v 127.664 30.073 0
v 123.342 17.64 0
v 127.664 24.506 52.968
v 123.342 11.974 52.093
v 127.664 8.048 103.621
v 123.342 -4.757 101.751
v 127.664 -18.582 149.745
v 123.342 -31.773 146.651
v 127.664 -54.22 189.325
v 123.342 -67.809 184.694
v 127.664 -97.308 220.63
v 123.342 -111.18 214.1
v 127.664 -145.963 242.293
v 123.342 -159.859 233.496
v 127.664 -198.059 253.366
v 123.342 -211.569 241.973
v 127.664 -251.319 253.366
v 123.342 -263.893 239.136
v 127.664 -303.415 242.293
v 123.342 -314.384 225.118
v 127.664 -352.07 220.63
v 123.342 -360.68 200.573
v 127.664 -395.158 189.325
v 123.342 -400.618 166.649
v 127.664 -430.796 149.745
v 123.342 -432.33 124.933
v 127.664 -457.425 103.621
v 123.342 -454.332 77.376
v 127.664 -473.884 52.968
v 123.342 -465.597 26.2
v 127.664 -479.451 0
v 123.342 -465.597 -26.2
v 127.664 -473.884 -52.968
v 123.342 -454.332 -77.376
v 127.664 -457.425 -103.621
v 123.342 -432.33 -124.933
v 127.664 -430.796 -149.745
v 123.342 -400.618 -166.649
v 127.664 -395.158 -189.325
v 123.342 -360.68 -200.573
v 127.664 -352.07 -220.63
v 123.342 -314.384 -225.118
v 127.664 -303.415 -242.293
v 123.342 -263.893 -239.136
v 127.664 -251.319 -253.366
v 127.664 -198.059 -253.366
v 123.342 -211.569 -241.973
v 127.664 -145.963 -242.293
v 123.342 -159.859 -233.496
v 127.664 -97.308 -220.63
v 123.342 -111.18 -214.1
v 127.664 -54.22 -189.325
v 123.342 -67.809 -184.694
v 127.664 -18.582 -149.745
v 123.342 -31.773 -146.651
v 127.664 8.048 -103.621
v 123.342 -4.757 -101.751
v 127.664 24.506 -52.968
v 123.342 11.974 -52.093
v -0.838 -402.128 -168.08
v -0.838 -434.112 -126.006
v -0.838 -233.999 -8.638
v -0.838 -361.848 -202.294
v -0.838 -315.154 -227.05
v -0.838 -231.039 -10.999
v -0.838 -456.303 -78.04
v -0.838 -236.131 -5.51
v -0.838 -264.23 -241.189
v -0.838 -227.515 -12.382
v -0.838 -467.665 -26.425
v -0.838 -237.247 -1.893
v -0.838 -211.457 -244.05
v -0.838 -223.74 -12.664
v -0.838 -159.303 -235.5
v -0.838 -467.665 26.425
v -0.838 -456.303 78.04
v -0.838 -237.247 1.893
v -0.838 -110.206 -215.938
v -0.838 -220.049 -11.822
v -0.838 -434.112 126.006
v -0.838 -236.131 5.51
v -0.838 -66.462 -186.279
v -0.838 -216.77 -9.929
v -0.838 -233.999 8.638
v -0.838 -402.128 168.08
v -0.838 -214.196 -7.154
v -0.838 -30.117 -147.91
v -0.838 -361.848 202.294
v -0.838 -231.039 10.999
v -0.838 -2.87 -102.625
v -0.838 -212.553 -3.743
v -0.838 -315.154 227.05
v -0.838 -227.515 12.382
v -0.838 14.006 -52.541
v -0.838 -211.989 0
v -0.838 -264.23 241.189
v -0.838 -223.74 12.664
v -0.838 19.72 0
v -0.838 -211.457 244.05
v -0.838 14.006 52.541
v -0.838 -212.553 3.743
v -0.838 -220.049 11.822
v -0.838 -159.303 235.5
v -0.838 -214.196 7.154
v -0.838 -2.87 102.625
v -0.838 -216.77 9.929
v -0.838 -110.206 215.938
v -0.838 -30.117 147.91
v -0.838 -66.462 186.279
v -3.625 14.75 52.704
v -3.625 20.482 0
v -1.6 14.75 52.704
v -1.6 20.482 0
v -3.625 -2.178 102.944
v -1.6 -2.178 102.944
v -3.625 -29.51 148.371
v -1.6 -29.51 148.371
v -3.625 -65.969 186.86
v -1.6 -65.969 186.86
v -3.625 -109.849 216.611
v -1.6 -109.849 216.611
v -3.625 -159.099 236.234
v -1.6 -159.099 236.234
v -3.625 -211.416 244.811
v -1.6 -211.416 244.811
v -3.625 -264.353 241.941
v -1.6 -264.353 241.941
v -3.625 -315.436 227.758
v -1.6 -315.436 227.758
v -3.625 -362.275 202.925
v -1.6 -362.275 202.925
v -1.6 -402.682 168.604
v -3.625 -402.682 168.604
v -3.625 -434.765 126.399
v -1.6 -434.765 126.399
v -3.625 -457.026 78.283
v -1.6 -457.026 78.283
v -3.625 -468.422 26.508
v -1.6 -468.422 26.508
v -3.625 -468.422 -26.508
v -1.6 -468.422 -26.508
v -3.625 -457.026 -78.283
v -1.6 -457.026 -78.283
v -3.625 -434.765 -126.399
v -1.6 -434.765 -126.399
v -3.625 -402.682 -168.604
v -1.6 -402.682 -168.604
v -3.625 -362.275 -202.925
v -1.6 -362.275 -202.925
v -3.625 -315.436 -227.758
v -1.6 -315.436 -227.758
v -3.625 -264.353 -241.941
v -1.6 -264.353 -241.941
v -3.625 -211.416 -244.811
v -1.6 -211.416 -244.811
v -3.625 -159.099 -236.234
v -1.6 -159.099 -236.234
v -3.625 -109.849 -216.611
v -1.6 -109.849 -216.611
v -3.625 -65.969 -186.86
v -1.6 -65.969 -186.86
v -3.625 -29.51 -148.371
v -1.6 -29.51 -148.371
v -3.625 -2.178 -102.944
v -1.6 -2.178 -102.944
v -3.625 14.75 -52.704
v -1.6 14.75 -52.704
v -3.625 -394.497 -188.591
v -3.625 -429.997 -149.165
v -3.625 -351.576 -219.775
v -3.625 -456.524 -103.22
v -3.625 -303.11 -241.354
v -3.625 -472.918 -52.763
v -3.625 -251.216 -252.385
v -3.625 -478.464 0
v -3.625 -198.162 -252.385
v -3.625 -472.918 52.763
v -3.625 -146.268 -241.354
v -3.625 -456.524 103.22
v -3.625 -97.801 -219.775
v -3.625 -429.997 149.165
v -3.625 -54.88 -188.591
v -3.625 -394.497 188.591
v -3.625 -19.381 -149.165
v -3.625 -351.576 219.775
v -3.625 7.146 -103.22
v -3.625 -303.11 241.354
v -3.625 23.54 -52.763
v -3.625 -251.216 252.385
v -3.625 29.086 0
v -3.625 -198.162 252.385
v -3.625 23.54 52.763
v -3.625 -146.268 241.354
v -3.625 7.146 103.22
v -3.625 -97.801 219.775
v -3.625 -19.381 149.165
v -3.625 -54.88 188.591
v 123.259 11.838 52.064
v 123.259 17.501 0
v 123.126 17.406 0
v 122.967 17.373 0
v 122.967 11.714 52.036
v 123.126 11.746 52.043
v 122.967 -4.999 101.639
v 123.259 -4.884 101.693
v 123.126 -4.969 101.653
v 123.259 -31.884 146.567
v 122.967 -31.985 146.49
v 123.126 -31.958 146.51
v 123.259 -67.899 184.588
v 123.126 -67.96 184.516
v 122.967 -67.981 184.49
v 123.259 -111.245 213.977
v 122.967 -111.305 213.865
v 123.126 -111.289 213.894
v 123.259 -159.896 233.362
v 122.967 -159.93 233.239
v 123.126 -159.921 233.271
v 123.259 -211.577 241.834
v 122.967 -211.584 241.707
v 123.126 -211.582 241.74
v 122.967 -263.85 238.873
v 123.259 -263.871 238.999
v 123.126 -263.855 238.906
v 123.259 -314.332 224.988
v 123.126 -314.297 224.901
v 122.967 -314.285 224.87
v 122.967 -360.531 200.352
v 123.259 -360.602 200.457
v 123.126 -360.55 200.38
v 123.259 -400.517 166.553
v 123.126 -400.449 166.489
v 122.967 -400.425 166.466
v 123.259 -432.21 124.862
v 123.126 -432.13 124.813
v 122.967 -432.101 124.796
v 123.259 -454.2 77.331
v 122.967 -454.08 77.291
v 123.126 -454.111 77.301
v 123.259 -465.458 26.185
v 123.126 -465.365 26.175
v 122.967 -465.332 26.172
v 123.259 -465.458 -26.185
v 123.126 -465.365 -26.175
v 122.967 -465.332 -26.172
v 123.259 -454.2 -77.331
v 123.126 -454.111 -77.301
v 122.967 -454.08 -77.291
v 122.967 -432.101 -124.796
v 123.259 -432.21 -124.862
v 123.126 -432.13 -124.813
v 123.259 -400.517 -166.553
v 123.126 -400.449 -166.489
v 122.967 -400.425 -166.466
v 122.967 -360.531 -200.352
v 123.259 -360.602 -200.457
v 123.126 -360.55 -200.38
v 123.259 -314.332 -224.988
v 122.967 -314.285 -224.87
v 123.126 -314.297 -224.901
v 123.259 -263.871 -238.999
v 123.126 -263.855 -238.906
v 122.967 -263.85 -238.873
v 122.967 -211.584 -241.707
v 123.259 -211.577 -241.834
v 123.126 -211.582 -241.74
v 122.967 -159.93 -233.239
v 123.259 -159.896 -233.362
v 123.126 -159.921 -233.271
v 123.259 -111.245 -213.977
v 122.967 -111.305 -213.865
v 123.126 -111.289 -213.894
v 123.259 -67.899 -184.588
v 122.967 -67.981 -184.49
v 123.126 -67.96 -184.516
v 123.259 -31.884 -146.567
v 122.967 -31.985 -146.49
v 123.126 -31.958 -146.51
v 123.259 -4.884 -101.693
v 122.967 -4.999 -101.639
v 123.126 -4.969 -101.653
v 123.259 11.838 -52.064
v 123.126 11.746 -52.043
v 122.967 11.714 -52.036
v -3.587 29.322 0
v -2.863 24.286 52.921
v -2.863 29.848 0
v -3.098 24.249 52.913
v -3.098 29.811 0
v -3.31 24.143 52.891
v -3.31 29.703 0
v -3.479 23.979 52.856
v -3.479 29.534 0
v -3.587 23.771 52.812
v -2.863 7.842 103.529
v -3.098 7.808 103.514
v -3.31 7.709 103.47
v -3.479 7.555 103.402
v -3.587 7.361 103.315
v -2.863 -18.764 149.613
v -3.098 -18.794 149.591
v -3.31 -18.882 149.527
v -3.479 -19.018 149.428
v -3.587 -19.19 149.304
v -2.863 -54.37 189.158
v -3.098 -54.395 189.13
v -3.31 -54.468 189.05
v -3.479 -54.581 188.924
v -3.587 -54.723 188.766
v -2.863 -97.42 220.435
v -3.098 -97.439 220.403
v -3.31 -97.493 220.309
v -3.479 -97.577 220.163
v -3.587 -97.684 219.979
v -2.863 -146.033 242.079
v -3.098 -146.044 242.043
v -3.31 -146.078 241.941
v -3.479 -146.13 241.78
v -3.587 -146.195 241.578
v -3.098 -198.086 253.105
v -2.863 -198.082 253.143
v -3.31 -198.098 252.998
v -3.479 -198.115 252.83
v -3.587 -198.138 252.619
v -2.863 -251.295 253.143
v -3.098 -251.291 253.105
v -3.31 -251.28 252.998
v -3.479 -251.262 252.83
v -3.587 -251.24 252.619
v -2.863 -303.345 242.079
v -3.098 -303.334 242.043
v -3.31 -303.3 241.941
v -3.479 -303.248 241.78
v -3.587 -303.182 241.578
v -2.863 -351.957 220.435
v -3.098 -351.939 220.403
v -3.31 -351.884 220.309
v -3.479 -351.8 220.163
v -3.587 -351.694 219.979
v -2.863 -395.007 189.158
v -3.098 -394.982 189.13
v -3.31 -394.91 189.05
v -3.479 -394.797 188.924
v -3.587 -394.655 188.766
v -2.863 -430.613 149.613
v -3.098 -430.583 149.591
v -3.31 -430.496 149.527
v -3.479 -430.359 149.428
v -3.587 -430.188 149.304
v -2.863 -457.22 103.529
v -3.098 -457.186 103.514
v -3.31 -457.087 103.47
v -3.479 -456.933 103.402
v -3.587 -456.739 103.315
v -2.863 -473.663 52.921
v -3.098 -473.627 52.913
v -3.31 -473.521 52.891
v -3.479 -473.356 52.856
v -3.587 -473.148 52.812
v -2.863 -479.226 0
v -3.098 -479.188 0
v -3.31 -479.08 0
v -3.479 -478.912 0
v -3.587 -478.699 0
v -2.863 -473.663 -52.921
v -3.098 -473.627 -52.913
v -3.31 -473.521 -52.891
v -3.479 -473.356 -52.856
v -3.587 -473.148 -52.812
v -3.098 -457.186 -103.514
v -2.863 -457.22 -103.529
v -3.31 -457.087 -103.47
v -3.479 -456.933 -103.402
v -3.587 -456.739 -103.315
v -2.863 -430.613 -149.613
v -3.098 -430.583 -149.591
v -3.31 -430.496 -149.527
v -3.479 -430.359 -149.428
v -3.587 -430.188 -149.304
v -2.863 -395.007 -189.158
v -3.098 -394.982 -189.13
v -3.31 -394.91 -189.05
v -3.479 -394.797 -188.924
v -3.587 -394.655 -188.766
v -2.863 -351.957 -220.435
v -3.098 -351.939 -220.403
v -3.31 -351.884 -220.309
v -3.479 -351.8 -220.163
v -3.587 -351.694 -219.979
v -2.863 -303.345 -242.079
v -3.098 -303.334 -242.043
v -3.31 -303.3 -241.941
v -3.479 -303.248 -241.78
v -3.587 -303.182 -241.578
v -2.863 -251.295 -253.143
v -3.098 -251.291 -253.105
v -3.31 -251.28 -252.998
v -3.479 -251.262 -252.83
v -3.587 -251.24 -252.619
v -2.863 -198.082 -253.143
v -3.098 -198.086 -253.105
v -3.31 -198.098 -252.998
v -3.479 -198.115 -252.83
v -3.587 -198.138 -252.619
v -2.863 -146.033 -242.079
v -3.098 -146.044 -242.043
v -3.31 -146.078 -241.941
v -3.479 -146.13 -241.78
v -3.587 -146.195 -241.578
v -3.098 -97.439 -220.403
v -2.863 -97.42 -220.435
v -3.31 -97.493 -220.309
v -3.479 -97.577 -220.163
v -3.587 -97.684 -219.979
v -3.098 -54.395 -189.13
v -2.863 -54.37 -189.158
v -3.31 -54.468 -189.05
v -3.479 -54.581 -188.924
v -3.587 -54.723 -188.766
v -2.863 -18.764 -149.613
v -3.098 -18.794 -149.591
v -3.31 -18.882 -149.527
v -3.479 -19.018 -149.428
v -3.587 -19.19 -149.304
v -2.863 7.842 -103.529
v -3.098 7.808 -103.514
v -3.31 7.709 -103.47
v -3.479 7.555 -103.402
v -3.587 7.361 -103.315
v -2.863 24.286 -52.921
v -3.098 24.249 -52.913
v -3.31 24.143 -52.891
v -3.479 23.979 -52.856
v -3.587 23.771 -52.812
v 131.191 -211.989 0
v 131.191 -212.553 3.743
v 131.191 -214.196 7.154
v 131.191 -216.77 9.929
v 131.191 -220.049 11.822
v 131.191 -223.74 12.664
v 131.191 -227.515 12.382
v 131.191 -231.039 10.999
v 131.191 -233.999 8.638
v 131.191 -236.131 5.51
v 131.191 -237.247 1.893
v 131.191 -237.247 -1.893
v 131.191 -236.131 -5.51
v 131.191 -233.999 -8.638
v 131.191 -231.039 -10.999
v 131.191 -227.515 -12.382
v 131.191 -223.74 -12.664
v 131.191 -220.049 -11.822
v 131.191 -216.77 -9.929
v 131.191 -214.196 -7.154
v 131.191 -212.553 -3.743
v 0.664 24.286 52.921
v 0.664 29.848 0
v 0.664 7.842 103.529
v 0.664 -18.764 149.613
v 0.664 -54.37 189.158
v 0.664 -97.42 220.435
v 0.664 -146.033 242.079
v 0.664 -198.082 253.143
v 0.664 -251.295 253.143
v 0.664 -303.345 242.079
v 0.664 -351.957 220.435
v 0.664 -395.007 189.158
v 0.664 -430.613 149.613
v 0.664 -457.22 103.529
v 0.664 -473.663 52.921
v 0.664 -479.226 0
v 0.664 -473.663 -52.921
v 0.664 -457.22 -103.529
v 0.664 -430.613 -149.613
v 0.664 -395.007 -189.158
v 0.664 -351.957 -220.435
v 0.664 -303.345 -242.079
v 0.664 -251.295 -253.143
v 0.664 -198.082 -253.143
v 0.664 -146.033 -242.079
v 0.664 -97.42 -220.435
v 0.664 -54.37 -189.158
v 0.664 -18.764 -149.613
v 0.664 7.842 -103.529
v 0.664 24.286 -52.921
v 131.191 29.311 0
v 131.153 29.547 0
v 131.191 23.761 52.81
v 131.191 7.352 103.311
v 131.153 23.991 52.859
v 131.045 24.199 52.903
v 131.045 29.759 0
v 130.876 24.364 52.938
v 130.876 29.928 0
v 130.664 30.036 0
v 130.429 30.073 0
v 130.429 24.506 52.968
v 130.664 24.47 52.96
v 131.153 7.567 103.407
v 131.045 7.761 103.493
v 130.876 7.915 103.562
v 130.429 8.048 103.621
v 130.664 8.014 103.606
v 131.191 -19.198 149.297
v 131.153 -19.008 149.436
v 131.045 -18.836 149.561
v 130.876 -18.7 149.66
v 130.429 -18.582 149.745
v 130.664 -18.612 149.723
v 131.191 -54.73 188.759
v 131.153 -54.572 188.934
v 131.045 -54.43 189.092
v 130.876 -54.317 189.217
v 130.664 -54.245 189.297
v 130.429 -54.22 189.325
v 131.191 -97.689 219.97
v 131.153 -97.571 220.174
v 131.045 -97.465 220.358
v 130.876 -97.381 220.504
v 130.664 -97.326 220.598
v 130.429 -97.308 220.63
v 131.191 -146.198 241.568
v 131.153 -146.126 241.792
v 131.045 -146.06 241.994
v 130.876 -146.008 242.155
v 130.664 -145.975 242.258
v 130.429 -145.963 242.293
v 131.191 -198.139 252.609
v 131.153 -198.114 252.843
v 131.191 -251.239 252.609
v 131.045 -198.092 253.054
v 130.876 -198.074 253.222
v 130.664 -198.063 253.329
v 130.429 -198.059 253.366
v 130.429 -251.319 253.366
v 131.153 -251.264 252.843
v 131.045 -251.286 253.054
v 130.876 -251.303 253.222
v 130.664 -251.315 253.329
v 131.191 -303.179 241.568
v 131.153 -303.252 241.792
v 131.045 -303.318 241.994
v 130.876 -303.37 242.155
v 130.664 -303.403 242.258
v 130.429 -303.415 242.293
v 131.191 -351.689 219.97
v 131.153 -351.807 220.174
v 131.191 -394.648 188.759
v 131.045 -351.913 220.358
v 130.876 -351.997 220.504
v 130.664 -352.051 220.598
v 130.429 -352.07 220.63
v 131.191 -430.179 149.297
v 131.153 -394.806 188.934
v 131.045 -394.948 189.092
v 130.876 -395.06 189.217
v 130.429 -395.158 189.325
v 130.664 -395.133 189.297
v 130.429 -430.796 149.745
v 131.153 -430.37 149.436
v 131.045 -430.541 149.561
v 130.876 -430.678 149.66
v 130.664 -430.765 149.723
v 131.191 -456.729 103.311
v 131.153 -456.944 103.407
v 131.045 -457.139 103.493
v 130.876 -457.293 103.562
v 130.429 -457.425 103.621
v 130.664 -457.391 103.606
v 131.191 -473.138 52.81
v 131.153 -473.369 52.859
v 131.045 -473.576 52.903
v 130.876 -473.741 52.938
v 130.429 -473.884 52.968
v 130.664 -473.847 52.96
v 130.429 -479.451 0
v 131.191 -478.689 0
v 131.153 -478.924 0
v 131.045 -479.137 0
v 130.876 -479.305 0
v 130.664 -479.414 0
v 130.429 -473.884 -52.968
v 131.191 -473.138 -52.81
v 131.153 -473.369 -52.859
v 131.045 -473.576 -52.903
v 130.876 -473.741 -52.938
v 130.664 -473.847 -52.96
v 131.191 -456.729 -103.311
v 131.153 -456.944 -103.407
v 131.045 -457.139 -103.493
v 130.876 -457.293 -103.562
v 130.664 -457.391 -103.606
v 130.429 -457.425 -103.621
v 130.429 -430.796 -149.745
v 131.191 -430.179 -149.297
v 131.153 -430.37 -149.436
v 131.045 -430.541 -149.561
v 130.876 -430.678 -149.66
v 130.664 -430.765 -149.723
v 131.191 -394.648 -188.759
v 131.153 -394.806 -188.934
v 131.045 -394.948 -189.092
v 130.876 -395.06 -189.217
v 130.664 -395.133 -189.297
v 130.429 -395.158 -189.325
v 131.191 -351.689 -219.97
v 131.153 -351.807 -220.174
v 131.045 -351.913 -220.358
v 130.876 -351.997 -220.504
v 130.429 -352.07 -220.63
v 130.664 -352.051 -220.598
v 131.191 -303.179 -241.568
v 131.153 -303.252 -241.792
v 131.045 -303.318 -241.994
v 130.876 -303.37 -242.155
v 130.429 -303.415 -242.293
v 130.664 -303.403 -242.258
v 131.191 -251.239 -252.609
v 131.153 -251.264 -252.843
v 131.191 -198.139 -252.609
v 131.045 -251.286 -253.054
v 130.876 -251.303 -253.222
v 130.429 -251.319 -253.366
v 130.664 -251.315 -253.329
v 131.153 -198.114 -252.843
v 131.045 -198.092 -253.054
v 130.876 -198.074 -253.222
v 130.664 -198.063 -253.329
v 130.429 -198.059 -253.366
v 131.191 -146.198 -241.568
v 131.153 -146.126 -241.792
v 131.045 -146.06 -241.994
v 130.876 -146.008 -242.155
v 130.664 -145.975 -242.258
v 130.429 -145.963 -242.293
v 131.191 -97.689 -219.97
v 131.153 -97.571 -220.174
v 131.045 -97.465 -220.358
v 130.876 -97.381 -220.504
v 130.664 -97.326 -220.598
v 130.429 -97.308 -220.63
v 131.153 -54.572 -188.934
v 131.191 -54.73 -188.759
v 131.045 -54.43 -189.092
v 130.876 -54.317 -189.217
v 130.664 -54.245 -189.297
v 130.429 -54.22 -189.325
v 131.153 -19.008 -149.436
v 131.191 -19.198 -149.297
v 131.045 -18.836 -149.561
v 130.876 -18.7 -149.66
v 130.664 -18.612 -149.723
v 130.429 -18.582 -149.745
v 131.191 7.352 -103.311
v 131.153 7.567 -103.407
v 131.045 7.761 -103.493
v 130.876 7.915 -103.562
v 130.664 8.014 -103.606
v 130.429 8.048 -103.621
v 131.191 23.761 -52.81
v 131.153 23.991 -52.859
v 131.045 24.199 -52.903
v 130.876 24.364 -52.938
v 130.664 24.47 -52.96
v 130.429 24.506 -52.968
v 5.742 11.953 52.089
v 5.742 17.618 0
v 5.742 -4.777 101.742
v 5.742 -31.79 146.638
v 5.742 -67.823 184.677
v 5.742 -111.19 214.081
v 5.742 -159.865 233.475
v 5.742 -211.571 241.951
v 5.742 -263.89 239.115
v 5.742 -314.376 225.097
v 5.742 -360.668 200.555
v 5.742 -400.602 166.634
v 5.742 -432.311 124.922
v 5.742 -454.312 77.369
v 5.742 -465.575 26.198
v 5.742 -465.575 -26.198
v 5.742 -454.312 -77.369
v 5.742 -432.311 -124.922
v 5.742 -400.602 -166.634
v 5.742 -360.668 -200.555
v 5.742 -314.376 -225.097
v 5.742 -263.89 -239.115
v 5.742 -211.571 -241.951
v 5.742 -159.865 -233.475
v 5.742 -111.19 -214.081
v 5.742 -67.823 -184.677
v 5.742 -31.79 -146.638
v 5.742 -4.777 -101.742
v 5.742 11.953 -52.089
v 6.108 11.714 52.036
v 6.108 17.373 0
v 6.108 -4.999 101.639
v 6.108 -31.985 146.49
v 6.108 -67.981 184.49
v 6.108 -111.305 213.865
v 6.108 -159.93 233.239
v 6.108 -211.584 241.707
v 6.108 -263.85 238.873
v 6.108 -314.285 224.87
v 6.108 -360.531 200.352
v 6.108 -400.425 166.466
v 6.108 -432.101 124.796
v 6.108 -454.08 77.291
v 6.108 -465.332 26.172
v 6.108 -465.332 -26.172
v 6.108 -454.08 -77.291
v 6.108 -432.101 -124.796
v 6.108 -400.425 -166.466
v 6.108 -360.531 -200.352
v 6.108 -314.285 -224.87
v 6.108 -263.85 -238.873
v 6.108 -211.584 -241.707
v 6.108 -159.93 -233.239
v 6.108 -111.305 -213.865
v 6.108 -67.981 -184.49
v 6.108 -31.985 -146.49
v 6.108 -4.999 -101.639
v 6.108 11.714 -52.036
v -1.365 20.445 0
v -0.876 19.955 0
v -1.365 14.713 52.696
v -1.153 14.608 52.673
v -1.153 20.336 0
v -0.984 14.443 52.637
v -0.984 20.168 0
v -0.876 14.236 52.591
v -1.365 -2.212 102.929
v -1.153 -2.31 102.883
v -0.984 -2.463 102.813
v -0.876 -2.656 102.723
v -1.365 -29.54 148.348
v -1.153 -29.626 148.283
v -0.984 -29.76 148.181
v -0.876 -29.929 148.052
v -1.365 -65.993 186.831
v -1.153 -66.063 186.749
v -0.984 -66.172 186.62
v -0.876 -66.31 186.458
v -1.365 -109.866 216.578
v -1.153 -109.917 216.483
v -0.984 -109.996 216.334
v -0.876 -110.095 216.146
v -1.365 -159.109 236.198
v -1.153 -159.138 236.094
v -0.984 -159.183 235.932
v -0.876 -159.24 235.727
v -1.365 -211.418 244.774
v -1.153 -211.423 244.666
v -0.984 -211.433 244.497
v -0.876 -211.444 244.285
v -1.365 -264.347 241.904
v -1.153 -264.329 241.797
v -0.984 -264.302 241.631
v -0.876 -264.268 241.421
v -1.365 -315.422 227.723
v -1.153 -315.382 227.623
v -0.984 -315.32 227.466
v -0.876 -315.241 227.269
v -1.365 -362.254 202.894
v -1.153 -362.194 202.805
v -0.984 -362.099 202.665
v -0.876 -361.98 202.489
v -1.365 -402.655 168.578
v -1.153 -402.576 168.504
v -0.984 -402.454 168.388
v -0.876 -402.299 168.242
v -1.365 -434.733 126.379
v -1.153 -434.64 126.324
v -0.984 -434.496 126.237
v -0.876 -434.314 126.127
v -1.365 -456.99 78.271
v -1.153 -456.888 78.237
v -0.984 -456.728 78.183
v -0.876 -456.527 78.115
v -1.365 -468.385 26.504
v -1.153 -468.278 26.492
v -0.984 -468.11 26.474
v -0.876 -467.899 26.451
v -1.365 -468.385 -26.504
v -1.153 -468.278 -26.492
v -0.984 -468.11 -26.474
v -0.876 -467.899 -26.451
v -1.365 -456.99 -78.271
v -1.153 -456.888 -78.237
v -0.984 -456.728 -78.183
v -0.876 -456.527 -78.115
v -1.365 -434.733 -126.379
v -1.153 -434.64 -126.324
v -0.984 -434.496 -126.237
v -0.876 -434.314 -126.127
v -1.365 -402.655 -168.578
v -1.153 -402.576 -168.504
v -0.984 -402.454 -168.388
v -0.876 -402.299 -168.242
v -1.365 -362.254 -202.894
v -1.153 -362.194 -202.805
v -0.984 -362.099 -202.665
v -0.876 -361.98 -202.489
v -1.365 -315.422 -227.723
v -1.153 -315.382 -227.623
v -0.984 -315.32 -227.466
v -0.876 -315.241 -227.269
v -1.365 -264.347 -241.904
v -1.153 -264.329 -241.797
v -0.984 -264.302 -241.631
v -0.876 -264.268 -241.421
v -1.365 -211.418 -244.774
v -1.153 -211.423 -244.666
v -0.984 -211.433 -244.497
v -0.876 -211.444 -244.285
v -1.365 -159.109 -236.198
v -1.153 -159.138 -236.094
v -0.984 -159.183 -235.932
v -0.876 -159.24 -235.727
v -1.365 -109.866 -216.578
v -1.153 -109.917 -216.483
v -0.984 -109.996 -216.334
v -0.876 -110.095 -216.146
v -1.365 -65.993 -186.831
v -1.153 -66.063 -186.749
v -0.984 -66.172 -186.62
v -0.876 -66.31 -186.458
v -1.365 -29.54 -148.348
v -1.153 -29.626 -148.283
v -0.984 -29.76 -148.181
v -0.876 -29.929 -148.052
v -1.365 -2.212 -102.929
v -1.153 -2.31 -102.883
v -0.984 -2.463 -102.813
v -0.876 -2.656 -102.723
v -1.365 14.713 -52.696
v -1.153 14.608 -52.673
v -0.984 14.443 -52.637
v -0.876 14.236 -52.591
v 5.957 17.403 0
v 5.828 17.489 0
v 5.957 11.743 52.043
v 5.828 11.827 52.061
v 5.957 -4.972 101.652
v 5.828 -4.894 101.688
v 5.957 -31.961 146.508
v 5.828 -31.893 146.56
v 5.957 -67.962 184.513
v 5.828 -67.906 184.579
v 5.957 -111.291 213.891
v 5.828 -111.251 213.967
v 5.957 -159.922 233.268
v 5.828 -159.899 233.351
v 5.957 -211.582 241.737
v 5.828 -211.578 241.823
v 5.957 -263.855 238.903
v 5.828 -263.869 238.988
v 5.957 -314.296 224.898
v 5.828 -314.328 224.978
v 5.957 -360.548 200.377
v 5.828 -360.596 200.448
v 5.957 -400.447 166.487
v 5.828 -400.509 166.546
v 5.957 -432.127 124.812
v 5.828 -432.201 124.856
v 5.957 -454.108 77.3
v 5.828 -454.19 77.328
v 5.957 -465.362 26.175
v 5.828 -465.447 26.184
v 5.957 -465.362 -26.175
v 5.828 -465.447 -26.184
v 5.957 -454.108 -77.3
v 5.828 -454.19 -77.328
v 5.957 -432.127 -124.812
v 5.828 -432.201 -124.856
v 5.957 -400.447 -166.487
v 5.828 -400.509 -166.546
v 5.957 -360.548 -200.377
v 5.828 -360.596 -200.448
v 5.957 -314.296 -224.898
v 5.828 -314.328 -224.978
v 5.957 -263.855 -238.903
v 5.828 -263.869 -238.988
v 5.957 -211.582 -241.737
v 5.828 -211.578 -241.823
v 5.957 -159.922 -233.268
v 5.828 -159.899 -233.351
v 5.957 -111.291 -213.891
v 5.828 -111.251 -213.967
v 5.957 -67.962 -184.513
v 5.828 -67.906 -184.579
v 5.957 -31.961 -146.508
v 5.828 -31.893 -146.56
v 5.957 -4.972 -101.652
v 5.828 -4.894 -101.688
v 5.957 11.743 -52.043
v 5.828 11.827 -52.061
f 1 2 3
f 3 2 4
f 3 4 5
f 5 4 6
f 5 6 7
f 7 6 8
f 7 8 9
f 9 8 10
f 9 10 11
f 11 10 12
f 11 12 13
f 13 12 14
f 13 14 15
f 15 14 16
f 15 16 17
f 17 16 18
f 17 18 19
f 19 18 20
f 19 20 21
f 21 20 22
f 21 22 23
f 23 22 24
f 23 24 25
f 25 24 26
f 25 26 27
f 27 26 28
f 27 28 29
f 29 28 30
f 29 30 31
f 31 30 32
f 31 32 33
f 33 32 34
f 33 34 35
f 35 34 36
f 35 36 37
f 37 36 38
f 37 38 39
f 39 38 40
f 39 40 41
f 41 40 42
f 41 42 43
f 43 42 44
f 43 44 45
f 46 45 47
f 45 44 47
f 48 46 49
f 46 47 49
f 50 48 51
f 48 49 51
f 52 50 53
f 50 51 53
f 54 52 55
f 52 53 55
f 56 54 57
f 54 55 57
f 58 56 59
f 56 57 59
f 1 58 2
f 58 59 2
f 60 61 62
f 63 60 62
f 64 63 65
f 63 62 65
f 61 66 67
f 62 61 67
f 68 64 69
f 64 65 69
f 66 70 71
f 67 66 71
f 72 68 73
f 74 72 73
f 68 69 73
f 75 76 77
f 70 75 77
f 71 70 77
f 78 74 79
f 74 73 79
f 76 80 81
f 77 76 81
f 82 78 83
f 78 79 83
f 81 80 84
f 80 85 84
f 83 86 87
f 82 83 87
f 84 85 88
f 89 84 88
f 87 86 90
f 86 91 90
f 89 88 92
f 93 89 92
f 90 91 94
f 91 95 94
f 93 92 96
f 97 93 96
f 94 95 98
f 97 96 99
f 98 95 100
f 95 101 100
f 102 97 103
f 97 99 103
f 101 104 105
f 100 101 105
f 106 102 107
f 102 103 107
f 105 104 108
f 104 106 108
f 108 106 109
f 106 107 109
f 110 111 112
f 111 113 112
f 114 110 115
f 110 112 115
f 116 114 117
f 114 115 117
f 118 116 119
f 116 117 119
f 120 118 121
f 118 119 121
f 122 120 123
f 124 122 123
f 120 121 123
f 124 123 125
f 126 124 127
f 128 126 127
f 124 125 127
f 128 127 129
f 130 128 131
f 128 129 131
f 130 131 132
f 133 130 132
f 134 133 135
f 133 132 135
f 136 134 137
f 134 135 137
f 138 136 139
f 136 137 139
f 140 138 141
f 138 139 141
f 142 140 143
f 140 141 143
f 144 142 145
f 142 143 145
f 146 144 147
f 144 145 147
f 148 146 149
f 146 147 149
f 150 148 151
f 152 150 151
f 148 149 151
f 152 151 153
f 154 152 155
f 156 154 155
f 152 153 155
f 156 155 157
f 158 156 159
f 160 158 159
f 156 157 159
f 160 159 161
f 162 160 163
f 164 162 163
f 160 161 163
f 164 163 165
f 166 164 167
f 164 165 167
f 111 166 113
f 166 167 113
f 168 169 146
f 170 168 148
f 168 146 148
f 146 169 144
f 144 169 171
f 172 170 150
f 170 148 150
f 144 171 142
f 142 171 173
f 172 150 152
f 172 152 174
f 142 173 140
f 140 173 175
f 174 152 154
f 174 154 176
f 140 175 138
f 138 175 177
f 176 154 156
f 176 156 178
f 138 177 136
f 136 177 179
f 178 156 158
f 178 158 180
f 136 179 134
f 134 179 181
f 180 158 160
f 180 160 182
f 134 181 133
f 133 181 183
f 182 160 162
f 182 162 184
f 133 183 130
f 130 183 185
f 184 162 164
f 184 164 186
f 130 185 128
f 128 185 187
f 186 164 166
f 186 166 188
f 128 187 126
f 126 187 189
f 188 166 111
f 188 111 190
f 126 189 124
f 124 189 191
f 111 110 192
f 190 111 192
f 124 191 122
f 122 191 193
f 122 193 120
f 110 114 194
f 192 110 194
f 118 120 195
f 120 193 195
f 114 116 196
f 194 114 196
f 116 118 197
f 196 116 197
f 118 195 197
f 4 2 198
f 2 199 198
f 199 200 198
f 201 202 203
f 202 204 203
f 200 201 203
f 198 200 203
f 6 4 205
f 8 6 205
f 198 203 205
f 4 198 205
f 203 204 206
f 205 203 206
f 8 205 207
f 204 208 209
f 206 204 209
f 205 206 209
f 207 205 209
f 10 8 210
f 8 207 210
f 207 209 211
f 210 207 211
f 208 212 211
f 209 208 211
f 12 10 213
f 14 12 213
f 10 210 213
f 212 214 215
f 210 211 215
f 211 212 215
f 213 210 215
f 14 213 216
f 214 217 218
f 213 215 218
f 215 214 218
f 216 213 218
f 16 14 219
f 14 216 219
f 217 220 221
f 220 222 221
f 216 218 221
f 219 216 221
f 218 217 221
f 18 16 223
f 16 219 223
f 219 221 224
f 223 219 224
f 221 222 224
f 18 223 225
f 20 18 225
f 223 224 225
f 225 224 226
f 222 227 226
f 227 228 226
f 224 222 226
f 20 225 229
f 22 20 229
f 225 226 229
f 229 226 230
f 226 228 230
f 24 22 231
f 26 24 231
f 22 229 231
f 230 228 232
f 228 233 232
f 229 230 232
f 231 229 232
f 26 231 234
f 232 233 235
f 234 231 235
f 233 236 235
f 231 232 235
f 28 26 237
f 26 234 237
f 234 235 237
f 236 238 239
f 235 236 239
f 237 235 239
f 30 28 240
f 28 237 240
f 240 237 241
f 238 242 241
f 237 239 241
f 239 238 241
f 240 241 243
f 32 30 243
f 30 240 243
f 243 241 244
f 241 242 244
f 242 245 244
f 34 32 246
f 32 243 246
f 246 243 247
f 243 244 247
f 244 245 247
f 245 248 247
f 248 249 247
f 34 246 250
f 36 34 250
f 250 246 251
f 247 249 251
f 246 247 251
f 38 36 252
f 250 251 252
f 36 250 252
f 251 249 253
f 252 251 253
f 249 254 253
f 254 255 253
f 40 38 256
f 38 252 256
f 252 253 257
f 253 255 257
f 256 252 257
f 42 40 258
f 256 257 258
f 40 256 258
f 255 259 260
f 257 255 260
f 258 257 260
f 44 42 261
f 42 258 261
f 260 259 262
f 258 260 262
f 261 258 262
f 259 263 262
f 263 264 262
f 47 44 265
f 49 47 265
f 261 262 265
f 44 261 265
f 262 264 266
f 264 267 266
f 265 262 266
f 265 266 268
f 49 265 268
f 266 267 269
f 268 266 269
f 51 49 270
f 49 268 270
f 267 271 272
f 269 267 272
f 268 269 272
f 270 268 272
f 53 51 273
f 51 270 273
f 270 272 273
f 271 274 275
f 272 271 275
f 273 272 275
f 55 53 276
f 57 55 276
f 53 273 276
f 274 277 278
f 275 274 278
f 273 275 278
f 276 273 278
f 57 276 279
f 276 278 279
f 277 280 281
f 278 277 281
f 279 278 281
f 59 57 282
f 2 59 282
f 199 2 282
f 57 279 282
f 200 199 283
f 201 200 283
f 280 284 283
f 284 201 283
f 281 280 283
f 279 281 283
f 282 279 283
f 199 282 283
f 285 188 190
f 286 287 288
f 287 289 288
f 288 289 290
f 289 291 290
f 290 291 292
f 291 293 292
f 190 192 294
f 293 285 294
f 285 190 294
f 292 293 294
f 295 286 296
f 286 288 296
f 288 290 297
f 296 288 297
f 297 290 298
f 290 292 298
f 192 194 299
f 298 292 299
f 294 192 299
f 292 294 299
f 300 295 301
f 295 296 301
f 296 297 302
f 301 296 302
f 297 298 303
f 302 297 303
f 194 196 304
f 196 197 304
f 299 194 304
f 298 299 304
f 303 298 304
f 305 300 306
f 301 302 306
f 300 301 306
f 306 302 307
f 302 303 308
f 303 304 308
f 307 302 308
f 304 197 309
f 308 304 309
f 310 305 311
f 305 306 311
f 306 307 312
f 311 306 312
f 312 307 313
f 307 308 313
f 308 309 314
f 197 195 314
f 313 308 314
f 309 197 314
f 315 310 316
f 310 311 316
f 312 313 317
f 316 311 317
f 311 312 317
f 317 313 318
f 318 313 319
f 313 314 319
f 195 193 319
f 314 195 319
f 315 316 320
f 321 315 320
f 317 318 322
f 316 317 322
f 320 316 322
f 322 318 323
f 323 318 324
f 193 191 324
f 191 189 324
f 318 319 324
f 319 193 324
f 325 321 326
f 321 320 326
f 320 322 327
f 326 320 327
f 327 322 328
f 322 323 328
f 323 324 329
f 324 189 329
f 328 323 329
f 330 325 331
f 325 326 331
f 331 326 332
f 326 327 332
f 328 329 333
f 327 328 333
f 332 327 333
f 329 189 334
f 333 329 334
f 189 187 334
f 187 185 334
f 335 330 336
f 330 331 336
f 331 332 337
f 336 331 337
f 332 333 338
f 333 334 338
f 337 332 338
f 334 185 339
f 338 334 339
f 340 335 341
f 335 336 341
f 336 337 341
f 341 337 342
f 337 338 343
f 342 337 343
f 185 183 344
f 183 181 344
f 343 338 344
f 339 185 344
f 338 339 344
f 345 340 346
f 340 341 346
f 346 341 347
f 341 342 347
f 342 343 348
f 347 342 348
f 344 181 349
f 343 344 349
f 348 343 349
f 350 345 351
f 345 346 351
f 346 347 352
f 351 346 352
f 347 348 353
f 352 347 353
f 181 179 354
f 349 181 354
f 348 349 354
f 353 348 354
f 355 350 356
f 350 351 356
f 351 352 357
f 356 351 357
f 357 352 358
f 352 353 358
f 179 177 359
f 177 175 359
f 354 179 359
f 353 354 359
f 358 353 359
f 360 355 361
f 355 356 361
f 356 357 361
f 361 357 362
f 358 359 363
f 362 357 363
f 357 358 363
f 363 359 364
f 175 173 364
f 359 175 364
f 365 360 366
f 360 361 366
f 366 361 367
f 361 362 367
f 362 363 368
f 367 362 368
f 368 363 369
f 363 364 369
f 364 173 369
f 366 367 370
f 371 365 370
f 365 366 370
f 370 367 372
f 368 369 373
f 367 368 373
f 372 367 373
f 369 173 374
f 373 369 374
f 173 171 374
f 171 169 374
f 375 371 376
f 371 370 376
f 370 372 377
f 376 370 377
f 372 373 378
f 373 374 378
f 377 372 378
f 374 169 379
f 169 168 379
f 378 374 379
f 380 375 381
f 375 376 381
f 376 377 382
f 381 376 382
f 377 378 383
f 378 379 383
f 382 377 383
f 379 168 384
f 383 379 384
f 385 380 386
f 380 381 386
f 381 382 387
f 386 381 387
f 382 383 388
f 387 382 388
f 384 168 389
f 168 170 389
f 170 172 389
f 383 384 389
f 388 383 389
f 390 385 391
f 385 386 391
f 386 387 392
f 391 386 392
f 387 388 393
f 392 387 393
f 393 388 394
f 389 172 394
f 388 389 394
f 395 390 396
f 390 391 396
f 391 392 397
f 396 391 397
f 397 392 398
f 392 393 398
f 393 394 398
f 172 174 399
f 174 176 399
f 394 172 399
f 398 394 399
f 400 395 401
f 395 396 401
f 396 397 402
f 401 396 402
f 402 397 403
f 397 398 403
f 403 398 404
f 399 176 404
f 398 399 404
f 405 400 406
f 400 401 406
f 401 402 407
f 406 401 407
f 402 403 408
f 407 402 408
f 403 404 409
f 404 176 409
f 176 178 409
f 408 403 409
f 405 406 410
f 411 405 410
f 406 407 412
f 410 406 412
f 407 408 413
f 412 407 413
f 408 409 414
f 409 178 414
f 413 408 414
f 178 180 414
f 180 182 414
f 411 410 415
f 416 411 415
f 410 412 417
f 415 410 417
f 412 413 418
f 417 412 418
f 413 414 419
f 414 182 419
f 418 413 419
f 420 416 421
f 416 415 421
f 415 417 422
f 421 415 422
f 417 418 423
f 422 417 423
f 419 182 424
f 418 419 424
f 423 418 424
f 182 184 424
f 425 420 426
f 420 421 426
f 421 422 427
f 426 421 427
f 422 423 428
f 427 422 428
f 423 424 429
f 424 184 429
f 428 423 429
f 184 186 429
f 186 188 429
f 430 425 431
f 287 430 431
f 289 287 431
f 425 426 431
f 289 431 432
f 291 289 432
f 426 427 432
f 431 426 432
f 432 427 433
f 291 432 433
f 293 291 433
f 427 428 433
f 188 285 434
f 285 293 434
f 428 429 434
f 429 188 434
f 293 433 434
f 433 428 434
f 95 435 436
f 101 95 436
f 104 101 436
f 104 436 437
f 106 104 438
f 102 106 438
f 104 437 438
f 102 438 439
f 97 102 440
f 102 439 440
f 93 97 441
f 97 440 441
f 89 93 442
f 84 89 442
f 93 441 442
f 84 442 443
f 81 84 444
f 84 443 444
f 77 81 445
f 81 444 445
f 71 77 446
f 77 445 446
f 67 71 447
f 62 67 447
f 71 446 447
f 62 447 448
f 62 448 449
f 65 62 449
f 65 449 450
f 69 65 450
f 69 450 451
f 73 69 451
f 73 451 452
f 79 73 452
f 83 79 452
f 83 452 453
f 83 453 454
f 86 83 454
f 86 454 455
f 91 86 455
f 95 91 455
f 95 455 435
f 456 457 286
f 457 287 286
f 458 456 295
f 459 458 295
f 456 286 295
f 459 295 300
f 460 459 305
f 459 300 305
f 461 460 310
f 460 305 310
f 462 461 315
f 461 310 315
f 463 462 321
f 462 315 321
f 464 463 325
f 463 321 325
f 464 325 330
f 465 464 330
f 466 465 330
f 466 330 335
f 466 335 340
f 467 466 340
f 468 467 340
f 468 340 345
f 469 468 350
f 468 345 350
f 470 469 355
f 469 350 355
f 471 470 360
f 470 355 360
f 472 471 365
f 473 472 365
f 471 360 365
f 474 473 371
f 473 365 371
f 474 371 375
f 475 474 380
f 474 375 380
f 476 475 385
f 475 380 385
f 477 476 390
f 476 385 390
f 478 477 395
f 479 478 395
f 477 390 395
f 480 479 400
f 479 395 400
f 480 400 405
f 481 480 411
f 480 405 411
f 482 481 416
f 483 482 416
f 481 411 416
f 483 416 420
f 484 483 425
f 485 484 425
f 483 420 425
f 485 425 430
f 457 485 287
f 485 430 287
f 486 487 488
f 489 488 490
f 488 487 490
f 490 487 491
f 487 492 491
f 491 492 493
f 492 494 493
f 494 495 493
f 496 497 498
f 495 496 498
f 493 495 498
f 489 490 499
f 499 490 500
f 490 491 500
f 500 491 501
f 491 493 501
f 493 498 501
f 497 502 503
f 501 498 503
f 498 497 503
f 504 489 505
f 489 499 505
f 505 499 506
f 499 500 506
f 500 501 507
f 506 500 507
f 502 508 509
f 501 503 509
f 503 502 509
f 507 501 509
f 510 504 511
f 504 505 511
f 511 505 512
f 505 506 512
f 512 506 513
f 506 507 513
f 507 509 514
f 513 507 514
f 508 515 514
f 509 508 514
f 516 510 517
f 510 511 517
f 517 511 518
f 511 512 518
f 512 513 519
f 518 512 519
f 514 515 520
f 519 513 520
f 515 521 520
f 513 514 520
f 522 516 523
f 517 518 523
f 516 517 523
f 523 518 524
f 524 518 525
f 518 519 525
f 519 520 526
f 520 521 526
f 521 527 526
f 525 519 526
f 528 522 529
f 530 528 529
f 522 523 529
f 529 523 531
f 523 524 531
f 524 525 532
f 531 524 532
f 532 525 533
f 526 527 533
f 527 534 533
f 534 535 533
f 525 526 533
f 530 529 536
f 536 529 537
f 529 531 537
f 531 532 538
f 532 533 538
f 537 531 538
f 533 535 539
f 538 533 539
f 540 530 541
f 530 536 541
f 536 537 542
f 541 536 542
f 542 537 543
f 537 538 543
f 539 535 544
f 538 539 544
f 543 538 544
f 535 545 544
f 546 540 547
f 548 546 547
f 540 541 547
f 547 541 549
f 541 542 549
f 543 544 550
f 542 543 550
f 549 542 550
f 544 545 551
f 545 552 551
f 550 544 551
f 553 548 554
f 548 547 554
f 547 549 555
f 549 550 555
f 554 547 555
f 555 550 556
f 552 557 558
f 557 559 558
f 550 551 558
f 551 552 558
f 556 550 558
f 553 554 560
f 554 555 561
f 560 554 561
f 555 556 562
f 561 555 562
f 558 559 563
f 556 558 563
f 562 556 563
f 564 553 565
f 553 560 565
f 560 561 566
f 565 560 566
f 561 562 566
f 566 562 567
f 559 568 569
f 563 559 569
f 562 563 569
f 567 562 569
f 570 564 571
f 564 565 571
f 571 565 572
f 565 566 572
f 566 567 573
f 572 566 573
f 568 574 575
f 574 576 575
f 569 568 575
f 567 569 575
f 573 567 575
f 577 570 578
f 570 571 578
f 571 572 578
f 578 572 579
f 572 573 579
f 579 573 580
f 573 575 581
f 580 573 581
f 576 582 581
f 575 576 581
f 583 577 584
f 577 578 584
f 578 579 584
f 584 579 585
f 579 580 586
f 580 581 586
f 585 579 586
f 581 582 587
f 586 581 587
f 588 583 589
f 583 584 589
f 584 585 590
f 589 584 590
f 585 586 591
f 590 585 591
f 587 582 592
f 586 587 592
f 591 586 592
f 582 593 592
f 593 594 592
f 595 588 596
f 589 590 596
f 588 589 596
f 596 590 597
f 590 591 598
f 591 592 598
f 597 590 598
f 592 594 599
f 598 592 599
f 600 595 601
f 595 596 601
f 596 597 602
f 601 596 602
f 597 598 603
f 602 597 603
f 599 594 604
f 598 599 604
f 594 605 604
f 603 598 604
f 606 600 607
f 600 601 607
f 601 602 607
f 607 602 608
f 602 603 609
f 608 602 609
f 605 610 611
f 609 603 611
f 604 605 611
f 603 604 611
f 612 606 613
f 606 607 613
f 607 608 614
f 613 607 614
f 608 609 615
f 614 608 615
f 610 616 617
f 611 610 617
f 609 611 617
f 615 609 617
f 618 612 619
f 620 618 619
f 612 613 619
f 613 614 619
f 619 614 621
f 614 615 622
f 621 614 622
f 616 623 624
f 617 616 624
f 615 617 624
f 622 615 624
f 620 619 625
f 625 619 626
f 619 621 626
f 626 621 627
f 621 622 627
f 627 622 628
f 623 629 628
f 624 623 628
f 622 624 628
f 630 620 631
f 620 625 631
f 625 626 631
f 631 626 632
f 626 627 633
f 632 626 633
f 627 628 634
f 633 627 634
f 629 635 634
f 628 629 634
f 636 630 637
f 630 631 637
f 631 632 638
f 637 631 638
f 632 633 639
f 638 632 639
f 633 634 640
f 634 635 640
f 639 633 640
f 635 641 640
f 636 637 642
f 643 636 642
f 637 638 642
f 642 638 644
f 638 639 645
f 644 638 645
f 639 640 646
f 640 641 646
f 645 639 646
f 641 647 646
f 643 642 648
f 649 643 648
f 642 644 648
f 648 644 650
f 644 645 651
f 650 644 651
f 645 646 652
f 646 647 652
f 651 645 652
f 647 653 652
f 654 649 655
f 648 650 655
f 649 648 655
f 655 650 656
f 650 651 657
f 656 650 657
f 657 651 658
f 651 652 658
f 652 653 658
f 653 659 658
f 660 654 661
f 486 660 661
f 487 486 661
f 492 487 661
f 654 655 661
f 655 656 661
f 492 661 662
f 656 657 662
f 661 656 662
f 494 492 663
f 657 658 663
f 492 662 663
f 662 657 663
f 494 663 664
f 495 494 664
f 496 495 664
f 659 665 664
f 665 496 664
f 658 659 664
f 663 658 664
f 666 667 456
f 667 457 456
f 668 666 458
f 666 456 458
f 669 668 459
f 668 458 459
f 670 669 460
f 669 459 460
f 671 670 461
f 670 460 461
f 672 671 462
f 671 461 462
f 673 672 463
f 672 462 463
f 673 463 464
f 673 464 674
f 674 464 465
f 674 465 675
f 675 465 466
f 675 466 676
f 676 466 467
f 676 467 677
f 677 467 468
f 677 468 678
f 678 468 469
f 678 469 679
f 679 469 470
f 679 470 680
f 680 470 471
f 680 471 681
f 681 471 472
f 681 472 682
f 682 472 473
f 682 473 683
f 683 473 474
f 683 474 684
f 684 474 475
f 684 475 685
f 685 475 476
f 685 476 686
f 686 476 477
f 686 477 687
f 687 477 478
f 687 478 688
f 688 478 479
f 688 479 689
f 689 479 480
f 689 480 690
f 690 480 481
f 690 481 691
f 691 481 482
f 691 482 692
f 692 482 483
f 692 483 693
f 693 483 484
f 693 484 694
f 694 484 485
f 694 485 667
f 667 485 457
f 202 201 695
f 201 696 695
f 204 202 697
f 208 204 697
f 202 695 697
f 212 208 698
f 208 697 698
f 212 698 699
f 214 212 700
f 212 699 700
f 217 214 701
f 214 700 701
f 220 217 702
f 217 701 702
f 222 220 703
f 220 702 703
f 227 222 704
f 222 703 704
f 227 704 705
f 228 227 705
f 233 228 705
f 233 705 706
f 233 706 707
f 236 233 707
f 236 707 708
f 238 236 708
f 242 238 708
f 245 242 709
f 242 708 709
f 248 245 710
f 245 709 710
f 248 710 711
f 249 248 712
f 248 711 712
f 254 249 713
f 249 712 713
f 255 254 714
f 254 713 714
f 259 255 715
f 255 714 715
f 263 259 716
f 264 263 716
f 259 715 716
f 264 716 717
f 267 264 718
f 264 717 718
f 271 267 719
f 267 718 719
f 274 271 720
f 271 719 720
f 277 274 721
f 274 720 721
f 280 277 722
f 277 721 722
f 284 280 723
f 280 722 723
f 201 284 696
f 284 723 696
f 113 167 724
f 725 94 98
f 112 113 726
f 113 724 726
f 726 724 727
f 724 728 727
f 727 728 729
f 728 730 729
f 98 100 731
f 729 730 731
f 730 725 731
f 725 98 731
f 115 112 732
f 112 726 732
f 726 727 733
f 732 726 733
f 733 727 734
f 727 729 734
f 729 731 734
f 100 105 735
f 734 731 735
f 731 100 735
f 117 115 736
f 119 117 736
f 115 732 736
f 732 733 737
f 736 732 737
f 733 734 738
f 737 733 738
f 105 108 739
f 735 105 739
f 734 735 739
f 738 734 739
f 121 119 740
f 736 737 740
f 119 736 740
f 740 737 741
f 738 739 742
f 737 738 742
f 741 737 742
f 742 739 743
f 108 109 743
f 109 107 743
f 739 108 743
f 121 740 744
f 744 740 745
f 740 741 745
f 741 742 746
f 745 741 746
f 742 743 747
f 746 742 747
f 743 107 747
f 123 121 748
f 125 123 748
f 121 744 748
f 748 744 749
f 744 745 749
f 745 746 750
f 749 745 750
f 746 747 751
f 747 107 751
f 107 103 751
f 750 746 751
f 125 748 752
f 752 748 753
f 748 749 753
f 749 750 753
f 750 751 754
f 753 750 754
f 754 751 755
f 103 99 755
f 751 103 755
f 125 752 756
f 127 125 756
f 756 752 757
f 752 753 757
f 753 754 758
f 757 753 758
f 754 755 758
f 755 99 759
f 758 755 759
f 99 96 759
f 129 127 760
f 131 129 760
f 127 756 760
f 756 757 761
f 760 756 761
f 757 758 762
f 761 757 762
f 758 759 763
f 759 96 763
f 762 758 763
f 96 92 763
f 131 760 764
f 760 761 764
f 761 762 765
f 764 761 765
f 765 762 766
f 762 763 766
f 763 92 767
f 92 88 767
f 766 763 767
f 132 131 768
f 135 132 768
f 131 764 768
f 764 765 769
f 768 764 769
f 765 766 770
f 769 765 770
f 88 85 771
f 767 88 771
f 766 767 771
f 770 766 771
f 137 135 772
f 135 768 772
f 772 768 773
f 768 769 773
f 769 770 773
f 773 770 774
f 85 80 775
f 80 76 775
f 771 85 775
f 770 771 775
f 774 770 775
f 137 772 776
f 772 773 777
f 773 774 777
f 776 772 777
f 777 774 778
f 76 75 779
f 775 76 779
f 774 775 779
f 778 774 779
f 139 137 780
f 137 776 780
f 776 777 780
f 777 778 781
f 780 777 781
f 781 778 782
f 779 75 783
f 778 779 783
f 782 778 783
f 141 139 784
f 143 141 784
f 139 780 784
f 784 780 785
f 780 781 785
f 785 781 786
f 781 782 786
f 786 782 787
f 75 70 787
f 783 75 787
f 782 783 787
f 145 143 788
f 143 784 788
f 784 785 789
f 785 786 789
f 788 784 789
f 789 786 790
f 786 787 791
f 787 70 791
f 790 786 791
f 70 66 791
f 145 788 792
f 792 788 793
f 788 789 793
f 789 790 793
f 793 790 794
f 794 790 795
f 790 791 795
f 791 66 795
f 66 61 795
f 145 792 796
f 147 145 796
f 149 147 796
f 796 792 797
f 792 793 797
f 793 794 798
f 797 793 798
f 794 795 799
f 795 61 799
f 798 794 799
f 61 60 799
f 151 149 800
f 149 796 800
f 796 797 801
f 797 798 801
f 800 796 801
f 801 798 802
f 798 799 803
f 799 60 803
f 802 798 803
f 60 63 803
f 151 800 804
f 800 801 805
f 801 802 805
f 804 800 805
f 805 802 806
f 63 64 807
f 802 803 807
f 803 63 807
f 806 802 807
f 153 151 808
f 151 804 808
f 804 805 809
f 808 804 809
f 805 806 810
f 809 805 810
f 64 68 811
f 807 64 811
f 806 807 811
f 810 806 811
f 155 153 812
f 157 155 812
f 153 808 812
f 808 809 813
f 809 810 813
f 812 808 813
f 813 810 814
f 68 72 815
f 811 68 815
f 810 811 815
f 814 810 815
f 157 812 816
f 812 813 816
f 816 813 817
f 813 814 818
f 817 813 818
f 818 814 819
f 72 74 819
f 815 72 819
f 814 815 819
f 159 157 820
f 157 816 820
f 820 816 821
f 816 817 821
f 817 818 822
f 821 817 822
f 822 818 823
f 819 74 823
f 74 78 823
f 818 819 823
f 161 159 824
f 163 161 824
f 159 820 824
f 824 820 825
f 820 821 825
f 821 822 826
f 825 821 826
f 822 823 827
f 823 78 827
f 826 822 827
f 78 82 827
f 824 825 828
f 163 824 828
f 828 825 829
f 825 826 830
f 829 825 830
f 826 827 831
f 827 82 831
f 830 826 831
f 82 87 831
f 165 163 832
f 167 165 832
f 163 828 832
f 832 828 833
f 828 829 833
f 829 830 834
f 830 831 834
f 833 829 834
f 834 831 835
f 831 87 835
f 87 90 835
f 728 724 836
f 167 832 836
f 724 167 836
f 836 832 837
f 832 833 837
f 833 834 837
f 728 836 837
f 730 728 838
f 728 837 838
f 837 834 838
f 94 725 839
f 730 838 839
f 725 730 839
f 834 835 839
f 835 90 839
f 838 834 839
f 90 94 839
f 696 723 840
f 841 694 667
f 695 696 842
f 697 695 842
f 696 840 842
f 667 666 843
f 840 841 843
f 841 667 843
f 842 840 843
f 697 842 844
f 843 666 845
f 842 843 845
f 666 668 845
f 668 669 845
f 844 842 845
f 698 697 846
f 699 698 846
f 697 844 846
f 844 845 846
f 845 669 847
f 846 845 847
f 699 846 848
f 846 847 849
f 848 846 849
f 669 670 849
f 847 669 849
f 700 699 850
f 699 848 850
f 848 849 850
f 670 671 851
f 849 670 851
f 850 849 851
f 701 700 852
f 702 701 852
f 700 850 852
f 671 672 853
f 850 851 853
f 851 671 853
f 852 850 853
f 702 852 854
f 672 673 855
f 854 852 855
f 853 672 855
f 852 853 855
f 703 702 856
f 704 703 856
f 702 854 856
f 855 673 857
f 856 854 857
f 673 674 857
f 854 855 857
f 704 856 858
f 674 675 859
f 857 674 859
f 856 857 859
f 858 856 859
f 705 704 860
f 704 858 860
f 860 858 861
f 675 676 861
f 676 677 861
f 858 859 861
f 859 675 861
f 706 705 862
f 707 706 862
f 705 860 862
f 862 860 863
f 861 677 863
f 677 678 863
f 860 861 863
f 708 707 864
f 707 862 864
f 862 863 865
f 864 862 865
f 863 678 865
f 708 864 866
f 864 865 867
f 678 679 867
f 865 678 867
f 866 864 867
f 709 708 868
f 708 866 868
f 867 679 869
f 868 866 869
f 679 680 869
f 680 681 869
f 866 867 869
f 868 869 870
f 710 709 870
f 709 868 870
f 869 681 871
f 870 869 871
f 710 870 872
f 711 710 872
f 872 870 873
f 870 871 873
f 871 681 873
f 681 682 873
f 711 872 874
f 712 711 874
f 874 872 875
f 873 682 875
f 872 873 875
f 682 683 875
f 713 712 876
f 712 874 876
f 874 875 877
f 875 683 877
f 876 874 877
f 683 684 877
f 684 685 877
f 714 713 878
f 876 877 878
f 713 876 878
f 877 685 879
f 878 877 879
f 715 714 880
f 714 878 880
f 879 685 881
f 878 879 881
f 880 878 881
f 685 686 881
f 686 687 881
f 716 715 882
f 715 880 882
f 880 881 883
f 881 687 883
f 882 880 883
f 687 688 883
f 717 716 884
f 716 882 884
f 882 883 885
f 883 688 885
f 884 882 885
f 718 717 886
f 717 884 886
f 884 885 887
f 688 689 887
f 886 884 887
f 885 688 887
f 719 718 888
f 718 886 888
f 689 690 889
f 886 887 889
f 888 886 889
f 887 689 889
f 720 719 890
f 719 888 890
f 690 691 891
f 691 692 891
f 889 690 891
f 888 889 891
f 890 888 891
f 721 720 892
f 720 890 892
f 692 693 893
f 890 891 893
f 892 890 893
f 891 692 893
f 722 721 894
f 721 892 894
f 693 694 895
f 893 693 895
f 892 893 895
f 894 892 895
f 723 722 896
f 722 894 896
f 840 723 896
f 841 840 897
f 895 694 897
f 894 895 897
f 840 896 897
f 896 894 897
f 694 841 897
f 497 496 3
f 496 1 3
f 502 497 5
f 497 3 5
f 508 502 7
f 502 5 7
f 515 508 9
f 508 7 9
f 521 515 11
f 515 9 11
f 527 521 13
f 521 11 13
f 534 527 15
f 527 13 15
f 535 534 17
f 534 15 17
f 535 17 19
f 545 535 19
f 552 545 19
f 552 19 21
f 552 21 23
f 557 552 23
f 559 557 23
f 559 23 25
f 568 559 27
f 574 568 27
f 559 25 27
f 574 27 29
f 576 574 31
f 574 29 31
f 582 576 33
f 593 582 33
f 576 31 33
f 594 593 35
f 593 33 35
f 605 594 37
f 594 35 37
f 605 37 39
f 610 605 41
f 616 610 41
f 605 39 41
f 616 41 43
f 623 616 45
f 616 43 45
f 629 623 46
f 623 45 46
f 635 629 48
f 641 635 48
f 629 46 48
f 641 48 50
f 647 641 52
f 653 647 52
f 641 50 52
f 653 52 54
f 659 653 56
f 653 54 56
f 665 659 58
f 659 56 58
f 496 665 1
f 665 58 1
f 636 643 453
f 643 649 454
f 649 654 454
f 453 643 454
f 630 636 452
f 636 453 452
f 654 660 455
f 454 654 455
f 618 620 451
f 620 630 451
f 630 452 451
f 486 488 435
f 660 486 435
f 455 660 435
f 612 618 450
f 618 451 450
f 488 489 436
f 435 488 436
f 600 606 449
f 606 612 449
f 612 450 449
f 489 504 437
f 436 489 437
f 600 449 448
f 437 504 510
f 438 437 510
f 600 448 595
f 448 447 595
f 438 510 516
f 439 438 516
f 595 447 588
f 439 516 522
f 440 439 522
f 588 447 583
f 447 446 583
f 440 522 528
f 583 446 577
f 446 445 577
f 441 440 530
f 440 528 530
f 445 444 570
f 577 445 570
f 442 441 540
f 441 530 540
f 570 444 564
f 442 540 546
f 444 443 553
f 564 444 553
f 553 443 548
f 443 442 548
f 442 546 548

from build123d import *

# Parameters (mm, degrees)
F2_R     = 12.7
F3_DEPTH = 134.8161187441


# Not quite as in the source:
# - a feature names something its author has since deleted; it is built from what else it names


with BuildPart() as f1:
    # F0 (on Top) → F1 (revolve)
    with BuildSketch(Plane.XY):
        with BuildLine():
            Line((-3.6245174784, 29.0860664694), (-3.6245174784, 20.4818164694))
            Line((-3.6245174784, 20.4818164694), (-1.6004623353, 20.4818164694))
            ThreePointArc((-1.6004623353, 20.4818164694), (-1.0616469681, 20.2586318366), (-0.8384623353, 19.7198164694))
            Line((-0.8384623353, 19.7198164694), (-0.8384623353, -224.6888160382))
            Line((-0.8384623353, -224.6888160382), (131.1906012657, -224.6888160382))
            Line((131.1906012657, -224.6888160382), (131.1906012657, 29.3111839618))
            ThreePointArc((131.1906012657, 29.3111839618), (130.967416633, 29.8499993291), (130.4286012657, 30.0731839618))
            Line((130.4286012657, 30.0731839618), (127.6640418936, 30.0731839618))
            Line((127.6640418936, 30.0731839618), (123.3422697523, 17.6397553064))
            ThreePointArc((123.3422697523, 17.6397553064), (123.1973905872, 17.4466211557), (122.967395476, 17.3731839618))
            Line((122.967395476, 17.3731839618), (6.1083994667, 17.3731839618))
            ThreePointArc((6.1083994667, 17.3731839618), (5.8880446333, 17.4399778914), (5.7418610892, 17.6178768884))
            Line((5.7418610892, 17.6178768884), (0.6640418936, 29.8480664694))
            Line((0.6640418936, 29.8480664694), (-2.8625174784, 29.8480664694))
            ThreePointArc((-2.8625174784, 29.8480664694), (-3.4013328457, 29.6248818366), (-3.6245174784, 29.0860664694))
        make_face()
    revolve(axis=Axis((65.1760694652, -224.6888160382, 0), (1, 0, 0)))

    # F2 (on face) → F3 (cut, through all)
    with BuildSketch(Plane.YZ.offset(131.1906012657)):
        with Locations((-224.6888160382, 0)):
            Circle(F2_R)
    extrude(amount=-F3_DEPTH, mode=Mode.SUBTRACT)


solid = f1.part
